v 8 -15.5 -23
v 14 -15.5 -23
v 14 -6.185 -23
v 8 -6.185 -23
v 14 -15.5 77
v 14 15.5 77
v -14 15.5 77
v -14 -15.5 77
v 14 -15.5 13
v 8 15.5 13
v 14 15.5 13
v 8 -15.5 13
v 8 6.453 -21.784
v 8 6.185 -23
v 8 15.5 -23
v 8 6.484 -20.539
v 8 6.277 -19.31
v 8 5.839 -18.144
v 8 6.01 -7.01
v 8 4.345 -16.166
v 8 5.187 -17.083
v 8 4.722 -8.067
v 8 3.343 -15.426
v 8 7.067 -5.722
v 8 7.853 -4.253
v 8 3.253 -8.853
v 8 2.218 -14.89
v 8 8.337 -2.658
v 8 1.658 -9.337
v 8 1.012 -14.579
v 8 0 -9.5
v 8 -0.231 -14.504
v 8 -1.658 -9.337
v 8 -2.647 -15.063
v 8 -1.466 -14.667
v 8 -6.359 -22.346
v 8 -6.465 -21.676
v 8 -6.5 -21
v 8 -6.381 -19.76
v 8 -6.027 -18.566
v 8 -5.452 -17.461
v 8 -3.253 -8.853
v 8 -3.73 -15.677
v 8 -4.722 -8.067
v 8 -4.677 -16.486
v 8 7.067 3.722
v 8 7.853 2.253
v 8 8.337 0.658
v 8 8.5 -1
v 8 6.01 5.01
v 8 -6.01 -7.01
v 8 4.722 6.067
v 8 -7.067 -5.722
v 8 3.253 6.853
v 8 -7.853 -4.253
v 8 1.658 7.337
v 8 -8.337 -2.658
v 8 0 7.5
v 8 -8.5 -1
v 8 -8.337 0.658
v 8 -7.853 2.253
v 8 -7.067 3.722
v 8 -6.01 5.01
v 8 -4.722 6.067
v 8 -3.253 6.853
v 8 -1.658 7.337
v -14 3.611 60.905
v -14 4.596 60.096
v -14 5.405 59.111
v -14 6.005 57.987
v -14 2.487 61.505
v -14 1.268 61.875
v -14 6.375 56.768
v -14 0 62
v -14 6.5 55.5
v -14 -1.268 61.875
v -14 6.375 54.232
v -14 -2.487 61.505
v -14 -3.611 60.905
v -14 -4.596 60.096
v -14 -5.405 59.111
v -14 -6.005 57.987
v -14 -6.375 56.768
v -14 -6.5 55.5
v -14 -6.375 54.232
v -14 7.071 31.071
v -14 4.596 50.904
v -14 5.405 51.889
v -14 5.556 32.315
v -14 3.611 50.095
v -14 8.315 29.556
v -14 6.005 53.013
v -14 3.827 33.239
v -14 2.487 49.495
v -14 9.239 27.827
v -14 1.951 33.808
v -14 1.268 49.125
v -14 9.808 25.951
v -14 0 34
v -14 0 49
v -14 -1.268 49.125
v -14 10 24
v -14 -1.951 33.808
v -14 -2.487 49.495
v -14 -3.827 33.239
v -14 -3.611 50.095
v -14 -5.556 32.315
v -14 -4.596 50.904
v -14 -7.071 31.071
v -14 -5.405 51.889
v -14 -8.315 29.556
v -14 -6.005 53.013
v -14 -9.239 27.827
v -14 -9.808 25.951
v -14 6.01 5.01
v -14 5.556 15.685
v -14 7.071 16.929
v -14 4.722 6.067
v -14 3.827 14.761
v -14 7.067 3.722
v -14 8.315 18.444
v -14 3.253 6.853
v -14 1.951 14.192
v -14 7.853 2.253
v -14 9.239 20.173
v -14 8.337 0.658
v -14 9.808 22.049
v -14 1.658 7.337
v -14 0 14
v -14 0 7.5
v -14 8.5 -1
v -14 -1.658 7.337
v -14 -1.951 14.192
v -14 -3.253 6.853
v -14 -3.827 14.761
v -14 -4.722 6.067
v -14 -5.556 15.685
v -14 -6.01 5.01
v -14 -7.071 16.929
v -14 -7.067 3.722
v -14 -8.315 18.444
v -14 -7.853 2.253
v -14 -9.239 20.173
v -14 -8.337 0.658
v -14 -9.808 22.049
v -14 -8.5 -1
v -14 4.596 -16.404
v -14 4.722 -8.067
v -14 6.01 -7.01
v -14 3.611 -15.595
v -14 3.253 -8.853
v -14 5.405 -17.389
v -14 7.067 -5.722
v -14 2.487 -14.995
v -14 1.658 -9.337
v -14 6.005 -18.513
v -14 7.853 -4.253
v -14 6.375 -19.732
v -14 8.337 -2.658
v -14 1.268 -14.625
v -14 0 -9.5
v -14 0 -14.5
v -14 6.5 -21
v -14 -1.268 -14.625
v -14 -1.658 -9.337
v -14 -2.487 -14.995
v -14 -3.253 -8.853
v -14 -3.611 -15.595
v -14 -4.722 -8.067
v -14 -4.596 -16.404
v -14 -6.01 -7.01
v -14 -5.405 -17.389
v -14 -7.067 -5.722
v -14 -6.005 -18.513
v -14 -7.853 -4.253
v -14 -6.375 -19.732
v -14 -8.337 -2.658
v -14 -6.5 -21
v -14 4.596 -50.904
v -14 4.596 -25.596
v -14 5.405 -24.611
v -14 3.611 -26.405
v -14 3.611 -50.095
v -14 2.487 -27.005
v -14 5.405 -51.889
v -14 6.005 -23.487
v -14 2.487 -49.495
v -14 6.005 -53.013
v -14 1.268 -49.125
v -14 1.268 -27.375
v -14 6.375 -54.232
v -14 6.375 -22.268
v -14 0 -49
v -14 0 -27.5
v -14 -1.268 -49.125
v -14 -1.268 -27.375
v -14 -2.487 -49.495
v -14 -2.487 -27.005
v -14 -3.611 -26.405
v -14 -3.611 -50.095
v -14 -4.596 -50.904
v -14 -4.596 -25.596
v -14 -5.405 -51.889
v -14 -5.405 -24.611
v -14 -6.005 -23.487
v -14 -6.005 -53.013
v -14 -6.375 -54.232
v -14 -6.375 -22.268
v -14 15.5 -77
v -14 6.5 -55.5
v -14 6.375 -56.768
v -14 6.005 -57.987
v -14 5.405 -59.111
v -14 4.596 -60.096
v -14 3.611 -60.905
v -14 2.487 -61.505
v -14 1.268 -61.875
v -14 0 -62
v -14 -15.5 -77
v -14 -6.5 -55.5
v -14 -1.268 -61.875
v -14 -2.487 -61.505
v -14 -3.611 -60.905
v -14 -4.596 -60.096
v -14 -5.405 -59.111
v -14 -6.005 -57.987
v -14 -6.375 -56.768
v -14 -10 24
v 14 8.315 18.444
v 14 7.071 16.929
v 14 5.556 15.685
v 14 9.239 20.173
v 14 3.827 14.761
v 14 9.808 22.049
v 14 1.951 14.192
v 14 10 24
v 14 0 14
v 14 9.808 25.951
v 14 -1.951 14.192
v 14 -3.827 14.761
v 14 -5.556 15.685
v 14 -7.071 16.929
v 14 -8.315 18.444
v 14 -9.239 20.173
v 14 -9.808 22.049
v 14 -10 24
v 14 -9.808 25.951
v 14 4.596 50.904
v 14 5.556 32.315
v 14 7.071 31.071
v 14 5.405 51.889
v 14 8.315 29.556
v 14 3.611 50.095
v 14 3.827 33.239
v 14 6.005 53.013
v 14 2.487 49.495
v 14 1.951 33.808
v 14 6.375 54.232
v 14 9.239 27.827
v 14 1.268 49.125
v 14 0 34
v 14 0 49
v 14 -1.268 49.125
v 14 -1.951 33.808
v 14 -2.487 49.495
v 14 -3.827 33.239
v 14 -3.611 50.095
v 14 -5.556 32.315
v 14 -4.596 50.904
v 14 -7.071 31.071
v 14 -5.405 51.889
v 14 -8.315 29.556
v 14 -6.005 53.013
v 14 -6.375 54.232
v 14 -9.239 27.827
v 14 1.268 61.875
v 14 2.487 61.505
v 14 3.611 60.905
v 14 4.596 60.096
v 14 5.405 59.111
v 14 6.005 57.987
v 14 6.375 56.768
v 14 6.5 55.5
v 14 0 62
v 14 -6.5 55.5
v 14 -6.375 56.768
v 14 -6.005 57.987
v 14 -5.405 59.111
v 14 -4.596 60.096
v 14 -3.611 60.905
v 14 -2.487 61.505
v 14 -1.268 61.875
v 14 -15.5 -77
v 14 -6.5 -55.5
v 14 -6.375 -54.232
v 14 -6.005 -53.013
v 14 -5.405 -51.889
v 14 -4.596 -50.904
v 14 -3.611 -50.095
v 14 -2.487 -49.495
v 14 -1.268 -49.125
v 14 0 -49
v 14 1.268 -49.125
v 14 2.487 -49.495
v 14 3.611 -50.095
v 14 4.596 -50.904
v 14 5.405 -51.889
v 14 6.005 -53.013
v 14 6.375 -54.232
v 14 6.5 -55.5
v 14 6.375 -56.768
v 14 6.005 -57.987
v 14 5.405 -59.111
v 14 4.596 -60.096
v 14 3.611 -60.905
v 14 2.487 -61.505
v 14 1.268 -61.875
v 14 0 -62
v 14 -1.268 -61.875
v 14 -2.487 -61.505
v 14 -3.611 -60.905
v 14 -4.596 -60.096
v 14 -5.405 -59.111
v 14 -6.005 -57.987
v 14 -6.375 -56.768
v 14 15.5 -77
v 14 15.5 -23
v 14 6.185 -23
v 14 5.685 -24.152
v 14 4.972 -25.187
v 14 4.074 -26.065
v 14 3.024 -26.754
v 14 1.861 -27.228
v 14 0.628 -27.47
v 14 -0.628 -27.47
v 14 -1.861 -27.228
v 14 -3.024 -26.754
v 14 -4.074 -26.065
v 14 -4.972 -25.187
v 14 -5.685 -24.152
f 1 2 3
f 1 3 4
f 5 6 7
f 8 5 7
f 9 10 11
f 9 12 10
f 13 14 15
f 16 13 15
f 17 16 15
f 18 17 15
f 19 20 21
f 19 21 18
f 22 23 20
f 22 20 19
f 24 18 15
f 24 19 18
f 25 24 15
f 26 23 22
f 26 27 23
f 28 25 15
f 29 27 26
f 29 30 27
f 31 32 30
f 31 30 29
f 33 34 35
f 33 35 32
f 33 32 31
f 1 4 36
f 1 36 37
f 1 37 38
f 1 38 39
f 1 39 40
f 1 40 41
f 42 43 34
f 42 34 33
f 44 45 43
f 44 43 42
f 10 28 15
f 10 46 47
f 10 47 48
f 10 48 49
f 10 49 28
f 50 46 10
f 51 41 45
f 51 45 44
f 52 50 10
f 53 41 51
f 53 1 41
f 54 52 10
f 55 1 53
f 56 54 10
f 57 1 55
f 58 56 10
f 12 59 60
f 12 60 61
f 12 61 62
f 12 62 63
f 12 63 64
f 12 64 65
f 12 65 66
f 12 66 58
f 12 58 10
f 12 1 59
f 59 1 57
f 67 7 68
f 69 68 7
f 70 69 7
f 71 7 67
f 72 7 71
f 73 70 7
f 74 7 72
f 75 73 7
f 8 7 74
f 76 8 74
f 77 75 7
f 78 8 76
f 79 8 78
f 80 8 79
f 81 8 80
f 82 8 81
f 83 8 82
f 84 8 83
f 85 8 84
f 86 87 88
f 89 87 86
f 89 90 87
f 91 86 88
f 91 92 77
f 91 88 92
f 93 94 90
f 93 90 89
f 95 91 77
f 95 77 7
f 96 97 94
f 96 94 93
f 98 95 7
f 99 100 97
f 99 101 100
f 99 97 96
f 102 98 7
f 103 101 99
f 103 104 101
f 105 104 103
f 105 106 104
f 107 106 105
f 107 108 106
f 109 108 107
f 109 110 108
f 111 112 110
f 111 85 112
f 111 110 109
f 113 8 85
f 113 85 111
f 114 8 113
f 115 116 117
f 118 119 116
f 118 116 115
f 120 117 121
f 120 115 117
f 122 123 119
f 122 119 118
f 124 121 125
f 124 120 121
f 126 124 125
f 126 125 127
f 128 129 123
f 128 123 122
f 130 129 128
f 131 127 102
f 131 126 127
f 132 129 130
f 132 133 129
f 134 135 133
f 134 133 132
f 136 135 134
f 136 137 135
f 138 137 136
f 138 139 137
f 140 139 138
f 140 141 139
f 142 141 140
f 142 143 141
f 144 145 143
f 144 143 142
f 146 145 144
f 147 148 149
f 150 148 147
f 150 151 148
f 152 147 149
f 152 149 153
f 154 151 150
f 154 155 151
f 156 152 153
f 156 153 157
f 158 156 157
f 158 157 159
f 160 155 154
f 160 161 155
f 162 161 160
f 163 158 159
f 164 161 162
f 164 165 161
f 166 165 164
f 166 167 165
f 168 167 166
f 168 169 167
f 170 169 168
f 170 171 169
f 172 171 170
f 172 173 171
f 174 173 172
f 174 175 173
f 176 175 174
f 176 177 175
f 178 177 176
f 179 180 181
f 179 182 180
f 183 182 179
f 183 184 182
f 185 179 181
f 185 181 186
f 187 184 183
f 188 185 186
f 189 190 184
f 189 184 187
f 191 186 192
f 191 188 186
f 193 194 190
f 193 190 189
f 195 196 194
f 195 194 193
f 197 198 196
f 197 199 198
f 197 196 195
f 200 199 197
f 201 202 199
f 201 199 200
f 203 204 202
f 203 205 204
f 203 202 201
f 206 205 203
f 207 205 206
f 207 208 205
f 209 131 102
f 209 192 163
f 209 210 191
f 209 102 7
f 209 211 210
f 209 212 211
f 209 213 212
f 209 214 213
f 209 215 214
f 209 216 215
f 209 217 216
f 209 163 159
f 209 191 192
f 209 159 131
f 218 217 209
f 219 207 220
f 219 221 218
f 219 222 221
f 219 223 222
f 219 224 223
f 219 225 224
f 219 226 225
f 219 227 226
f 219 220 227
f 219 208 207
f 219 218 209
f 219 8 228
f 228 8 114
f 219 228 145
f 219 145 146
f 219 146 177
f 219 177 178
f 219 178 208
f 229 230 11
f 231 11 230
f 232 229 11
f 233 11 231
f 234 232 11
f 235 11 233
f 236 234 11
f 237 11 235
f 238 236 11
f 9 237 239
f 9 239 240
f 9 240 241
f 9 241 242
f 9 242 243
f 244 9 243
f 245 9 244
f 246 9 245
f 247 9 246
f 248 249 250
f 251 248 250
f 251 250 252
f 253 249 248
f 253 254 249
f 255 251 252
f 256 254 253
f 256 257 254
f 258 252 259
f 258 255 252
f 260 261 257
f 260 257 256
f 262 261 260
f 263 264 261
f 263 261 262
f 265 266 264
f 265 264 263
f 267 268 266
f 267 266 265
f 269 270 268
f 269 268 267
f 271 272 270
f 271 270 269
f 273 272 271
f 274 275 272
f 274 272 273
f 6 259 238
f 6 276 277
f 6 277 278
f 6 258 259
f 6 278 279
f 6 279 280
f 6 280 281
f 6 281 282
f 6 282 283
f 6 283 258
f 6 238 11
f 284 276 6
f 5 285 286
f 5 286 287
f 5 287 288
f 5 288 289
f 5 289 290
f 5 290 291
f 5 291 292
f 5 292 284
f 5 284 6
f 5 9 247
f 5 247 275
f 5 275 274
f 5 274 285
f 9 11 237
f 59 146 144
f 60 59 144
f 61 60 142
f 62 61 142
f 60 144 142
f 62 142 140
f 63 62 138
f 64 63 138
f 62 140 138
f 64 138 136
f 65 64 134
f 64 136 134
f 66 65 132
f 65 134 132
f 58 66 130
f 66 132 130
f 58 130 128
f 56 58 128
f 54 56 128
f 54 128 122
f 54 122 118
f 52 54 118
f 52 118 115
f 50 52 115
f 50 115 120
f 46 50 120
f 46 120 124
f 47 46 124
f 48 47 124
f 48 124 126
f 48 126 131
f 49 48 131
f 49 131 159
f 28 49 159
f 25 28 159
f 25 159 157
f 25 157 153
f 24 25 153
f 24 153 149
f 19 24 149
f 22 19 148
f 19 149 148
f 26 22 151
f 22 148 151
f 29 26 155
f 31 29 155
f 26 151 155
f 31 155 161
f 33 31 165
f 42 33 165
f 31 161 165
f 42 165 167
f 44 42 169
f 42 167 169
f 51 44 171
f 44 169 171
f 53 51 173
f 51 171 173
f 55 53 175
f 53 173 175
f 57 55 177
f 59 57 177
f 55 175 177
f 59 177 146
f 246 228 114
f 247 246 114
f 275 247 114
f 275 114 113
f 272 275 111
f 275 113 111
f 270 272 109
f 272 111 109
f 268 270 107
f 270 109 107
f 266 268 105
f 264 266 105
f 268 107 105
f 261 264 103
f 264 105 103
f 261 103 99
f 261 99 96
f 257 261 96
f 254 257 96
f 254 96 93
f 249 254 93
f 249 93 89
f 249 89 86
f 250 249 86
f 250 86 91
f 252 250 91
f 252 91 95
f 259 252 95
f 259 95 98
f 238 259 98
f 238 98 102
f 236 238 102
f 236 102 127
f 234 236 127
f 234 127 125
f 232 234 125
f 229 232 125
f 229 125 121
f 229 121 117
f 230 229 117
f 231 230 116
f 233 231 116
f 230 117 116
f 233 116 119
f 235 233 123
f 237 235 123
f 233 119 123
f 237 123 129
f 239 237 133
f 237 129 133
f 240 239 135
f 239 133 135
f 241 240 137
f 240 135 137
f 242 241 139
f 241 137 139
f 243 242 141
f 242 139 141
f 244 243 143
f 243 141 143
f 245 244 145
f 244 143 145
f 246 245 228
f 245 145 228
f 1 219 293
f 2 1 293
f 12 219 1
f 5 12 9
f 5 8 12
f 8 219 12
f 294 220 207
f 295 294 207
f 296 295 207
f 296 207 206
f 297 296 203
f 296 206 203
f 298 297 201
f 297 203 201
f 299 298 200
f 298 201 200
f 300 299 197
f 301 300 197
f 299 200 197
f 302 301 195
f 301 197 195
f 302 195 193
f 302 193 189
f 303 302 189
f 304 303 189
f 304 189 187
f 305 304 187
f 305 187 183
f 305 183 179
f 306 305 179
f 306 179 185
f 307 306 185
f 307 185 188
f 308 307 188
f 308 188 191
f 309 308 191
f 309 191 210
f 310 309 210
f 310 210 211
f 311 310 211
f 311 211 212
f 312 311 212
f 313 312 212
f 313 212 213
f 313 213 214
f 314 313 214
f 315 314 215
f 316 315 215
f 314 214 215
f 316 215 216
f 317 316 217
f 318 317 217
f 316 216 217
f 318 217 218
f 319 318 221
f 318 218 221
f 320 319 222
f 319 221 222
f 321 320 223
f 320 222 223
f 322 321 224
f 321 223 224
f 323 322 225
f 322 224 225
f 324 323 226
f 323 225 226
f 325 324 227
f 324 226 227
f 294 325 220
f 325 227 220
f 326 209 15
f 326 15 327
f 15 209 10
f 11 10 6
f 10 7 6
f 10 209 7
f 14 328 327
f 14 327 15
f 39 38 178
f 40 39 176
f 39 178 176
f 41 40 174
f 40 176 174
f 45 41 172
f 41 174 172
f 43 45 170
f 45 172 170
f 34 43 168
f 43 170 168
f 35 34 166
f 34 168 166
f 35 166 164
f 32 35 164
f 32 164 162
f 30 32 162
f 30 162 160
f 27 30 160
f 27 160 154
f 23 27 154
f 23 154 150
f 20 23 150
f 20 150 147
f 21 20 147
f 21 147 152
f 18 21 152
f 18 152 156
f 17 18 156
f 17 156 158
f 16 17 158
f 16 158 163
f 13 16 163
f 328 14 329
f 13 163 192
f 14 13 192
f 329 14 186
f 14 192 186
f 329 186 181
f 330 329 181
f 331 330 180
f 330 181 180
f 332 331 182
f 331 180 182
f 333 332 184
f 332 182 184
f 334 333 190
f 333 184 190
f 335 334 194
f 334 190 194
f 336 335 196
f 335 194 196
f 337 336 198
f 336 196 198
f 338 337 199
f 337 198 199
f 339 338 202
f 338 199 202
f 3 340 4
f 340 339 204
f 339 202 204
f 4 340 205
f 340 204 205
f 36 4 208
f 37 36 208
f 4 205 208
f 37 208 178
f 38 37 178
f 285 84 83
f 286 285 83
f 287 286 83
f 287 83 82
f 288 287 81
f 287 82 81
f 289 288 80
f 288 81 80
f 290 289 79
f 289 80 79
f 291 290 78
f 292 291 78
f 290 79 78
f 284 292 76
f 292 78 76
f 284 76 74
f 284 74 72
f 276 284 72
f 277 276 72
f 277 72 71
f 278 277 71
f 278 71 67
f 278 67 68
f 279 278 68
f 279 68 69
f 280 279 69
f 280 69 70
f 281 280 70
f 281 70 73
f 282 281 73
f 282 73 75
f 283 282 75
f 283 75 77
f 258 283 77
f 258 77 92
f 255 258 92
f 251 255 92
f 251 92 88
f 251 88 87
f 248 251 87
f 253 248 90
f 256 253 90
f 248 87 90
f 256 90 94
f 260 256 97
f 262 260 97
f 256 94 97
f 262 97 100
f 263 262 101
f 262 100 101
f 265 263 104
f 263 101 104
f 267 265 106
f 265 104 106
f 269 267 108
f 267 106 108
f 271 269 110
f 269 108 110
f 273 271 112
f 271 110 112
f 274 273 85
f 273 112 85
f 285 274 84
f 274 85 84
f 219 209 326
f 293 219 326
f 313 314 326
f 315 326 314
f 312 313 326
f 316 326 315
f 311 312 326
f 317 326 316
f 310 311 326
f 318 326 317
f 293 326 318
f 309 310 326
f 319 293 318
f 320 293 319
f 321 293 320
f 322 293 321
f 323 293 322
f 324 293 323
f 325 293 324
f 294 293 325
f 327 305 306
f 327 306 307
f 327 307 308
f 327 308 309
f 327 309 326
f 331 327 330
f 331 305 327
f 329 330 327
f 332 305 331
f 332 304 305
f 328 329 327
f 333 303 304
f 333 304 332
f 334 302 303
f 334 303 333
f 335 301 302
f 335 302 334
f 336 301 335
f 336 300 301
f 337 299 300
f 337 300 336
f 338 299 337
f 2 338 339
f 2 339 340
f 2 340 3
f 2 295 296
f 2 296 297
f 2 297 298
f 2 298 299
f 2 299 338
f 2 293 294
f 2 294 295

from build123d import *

# Parameters (mm, degrees)
F1_DEPTH = 15.5
F2_R     = 6.5
F2_R_2   = 10
F2_R_3   = 8.5
F3_DEPTH = 28.001


with BuildPart() as f1:
    # F0 (on Front) → F1 (new body, symmetric)
    with BuildSketch(Plane.XZ):
        Polygon((14, 13), (14, 77), (-14, 77), (-14, -77), (14, -77), (14, -23), (8, -23), (8, 13), align=None)
    extrude(amount=F1_DEPTH, both=True)

    # F2 (on face) → F3 (cut, through all)
    with BuildSketch(Plane(origin=(-14, 0, 0), x_dir=(0, -1, 0), z_dir=(-1, 0, 0))):
        with Locations((0, 55.5)):
            Circle(F2_R)
        with Locations((0, 24)):
            Circle(F2_R_2)
        with Locations((0, -1)):
            Circle(F2_R_3)
        with Locations((0, -21)):
            Circle(F2_R)
        with Locations((0, -55.5)):
            Circle(F2_R)
    extrude(amount=-F3_DEPTH, mode=Mode.SUBTRACT)


solid = f1.part
